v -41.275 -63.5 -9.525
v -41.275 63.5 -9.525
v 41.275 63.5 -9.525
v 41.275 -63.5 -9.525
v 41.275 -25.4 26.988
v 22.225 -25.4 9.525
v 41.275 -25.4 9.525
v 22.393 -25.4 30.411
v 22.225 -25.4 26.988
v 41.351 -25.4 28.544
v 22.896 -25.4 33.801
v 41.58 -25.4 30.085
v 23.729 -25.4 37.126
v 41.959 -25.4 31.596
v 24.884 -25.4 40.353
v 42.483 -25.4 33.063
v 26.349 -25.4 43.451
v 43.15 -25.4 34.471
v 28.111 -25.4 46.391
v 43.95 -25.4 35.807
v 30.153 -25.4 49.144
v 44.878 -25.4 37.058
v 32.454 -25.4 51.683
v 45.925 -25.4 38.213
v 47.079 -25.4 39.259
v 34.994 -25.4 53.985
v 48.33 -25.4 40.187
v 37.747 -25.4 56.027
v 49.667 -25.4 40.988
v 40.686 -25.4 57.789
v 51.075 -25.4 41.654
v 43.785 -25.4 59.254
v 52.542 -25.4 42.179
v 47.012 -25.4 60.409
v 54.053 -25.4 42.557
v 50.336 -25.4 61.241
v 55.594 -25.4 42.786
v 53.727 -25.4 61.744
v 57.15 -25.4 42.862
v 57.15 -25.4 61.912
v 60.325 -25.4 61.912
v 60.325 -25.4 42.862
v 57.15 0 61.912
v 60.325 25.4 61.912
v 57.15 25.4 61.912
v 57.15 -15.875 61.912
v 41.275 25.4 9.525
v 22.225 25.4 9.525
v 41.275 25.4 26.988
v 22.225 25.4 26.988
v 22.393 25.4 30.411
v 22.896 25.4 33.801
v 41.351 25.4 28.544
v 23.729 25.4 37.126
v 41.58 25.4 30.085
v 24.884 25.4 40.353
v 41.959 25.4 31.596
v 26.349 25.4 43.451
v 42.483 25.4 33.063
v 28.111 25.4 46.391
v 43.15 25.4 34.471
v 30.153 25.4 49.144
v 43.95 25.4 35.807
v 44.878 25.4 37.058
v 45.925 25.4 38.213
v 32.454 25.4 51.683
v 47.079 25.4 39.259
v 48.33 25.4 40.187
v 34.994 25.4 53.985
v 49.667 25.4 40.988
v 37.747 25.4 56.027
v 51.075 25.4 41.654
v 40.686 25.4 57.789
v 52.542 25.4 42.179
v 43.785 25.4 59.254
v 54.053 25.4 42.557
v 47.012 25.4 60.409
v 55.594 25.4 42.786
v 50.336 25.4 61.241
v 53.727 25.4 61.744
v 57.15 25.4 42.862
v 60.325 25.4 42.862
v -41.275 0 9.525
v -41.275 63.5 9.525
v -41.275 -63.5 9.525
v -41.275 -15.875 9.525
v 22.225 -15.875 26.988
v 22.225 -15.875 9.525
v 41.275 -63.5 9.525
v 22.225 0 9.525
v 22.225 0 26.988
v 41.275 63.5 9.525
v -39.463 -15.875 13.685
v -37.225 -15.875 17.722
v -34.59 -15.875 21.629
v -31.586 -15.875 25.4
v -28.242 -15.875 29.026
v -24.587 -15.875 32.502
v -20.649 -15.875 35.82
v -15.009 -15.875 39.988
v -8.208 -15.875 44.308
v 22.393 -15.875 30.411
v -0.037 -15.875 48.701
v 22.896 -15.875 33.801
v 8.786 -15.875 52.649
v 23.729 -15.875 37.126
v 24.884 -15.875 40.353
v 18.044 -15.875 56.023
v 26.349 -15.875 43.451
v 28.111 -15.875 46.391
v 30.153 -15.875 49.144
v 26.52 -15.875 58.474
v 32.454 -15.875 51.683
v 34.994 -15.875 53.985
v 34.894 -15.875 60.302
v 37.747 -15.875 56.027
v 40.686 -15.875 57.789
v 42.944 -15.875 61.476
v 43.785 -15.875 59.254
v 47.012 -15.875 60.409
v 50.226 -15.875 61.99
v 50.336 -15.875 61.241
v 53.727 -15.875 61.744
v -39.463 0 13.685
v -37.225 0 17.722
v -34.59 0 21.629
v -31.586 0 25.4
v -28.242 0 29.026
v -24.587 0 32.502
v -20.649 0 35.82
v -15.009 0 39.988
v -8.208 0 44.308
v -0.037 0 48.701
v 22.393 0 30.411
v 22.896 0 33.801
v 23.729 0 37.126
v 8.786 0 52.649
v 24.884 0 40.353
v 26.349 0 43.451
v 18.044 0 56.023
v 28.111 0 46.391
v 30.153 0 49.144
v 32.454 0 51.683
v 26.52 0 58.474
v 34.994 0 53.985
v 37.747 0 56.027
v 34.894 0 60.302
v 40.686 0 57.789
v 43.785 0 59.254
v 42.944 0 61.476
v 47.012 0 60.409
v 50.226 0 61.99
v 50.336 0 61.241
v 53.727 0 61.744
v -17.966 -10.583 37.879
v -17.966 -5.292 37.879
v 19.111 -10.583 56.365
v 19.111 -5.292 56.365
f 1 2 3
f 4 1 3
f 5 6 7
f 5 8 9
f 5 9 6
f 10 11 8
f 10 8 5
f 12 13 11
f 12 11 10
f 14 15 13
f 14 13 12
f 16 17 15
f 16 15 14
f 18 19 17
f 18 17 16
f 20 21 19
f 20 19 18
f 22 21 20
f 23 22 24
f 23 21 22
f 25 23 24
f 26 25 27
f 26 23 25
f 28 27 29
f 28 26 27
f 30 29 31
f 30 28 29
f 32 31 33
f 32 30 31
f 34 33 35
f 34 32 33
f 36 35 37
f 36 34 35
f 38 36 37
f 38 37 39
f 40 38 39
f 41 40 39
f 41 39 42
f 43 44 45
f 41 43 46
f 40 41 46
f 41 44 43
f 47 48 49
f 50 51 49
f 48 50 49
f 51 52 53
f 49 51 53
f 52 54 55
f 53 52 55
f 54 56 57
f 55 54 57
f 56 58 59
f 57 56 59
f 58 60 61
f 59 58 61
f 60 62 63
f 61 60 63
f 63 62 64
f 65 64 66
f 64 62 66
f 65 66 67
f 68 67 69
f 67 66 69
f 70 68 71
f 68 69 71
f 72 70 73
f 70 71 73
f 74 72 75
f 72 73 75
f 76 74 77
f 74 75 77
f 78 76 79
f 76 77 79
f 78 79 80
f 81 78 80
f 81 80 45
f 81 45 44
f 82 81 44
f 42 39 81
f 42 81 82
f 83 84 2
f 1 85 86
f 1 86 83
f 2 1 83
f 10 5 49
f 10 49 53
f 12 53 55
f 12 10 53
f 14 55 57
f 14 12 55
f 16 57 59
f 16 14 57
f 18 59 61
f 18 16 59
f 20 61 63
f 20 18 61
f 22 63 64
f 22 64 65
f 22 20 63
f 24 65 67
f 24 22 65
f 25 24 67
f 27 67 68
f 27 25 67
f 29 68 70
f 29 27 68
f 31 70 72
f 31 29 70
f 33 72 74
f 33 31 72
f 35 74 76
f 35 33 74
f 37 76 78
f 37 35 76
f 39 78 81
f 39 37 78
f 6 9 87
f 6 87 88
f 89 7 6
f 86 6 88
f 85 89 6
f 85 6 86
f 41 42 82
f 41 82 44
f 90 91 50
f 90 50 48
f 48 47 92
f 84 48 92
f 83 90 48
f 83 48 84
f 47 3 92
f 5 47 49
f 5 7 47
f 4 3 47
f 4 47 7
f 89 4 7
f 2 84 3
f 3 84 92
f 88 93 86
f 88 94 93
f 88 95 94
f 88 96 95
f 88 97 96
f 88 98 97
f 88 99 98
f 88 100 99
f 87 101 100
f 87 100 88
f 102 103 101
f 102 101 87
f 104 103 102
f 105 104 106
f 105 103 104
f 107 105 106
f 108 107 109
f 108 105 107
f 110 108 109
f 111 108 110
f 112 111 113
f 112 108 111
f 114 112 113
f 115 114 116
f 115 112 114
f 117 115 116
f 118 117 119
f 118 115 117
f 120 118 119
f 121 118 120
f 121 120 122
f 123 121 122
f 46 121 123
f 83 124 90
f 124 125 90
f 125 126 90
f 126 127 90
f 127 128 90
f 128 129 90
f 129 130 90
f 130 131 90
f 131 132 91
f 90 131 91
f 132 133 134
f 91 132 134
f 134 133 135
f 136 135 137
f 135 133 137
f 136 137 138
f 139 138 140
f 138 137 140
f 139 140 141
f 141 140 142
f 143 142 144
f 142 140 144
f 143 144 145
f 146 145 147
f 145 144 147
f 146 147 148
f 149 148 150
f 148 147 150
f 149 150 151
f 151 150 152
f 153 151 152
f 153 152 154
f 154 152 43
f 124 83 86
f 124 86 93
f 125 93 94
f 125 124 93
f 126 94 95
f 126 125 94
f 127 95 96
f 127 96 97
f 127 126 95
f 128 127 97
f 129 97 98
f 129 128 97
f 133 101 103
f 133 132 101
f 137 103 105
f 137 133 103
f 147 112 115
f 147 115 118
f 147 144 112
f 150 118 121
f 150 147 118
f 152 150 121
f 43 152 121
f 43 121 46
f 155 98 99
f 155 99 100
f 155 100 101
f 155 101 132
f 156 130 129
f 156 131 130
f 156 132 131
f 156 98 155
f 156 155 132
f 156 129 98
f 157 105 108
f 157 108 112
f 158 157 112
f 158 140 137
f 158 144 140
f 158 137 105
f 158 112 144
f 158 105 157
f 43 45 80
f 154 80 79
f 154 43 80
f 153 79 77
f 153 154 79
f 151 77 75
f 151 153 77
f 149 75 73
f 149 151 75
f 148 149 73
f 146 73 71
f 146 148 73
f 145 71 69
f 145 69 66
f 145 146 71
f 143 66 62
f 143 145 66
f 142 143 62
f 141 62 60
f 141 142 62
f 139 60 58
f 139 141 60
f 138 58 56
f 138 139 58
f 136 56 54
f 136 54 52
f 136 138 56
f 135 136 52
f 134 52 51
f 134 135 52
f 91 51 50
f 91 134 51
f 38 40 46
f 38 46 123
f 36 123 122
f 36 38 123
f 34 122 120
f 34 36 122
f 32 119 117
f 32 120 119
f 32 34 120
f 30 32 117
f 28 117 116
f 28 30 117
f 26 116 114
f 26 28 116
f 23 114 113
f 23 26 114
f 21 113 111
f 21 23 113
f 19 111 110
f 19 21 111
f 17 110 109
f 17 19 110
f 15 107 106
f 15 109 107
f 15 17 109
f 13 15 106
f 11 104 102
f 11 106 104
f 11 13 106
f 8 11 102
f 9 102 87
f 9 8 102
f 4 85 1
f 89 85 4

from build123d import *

# Parameters (mm, degrees)
F1_DEPTH = 25.4
F2_DEPTH = 63.5
F3_DEPTH = 15.875


with BuildPart() as f1:
    # F0 (on Front) → F1 (new body, symmetric)
    with BuildSketch(Plane.XZ):
        with BuildLine():
            Line((22.225, 9.525), (41.275, 9.525))
            Line((41.275, 9.525), (41.275, 26.9875))
            ThreePointArc((41.275, 26.9875), (45.92468, 38.21282), (57.15, 42.8625))
            Line((57.15, 42.8625), (60.325, 42.8625))
            Line((60.325, 42.8625), (60.325, 61.9125))
            Line((60.325, 61.9125), (57.15, 61.9125))
            ThreePointArc((57.15, 61.9125), (32.454296, 51.683204), (22.225, 26.9875))
            Line((22.225, 26.9875), (22.225, 9.525))
        make_face()
    extrude(amount=F1_DEPTH, both=True)

    # F0 (on Front) → F2 (join, symmetric)
    with BuildSketch(Plane.XZ):
        Polygon((41.275, -9.525), (41.275, 9.525), (22.225, 9.525), (-41.275, 9.525), (-41.275, -9.525), align=None)
    extrude(amount=F2_DEPTH, both=True)

    # F0 (on Front) → F3 (join)
    with BuildSketch(Plane.XZ):
        with BuildLine():
            Line((-41.275, 9.525), (22.225, 9.525))
            Line((22.225, 9.525), (22.225, 26.9875))
            ThreePointArc((22.225, 26.9875), (32.454296, 51.683204), (57.15, 61.9125))
            add(Edge.make_bspline(
                [(-41.275, 9.525), (-29.119365, 41.789368), (22.899356, 63.857913), (57.15, 61.9125)],
                knots=[0, 0, 0, 0, 111.498569, 111.498569, 111.498569, 111.498569], degree=3))
        make_face()
    extrude(amount=F3_DEPTH)


solid = f1.part
